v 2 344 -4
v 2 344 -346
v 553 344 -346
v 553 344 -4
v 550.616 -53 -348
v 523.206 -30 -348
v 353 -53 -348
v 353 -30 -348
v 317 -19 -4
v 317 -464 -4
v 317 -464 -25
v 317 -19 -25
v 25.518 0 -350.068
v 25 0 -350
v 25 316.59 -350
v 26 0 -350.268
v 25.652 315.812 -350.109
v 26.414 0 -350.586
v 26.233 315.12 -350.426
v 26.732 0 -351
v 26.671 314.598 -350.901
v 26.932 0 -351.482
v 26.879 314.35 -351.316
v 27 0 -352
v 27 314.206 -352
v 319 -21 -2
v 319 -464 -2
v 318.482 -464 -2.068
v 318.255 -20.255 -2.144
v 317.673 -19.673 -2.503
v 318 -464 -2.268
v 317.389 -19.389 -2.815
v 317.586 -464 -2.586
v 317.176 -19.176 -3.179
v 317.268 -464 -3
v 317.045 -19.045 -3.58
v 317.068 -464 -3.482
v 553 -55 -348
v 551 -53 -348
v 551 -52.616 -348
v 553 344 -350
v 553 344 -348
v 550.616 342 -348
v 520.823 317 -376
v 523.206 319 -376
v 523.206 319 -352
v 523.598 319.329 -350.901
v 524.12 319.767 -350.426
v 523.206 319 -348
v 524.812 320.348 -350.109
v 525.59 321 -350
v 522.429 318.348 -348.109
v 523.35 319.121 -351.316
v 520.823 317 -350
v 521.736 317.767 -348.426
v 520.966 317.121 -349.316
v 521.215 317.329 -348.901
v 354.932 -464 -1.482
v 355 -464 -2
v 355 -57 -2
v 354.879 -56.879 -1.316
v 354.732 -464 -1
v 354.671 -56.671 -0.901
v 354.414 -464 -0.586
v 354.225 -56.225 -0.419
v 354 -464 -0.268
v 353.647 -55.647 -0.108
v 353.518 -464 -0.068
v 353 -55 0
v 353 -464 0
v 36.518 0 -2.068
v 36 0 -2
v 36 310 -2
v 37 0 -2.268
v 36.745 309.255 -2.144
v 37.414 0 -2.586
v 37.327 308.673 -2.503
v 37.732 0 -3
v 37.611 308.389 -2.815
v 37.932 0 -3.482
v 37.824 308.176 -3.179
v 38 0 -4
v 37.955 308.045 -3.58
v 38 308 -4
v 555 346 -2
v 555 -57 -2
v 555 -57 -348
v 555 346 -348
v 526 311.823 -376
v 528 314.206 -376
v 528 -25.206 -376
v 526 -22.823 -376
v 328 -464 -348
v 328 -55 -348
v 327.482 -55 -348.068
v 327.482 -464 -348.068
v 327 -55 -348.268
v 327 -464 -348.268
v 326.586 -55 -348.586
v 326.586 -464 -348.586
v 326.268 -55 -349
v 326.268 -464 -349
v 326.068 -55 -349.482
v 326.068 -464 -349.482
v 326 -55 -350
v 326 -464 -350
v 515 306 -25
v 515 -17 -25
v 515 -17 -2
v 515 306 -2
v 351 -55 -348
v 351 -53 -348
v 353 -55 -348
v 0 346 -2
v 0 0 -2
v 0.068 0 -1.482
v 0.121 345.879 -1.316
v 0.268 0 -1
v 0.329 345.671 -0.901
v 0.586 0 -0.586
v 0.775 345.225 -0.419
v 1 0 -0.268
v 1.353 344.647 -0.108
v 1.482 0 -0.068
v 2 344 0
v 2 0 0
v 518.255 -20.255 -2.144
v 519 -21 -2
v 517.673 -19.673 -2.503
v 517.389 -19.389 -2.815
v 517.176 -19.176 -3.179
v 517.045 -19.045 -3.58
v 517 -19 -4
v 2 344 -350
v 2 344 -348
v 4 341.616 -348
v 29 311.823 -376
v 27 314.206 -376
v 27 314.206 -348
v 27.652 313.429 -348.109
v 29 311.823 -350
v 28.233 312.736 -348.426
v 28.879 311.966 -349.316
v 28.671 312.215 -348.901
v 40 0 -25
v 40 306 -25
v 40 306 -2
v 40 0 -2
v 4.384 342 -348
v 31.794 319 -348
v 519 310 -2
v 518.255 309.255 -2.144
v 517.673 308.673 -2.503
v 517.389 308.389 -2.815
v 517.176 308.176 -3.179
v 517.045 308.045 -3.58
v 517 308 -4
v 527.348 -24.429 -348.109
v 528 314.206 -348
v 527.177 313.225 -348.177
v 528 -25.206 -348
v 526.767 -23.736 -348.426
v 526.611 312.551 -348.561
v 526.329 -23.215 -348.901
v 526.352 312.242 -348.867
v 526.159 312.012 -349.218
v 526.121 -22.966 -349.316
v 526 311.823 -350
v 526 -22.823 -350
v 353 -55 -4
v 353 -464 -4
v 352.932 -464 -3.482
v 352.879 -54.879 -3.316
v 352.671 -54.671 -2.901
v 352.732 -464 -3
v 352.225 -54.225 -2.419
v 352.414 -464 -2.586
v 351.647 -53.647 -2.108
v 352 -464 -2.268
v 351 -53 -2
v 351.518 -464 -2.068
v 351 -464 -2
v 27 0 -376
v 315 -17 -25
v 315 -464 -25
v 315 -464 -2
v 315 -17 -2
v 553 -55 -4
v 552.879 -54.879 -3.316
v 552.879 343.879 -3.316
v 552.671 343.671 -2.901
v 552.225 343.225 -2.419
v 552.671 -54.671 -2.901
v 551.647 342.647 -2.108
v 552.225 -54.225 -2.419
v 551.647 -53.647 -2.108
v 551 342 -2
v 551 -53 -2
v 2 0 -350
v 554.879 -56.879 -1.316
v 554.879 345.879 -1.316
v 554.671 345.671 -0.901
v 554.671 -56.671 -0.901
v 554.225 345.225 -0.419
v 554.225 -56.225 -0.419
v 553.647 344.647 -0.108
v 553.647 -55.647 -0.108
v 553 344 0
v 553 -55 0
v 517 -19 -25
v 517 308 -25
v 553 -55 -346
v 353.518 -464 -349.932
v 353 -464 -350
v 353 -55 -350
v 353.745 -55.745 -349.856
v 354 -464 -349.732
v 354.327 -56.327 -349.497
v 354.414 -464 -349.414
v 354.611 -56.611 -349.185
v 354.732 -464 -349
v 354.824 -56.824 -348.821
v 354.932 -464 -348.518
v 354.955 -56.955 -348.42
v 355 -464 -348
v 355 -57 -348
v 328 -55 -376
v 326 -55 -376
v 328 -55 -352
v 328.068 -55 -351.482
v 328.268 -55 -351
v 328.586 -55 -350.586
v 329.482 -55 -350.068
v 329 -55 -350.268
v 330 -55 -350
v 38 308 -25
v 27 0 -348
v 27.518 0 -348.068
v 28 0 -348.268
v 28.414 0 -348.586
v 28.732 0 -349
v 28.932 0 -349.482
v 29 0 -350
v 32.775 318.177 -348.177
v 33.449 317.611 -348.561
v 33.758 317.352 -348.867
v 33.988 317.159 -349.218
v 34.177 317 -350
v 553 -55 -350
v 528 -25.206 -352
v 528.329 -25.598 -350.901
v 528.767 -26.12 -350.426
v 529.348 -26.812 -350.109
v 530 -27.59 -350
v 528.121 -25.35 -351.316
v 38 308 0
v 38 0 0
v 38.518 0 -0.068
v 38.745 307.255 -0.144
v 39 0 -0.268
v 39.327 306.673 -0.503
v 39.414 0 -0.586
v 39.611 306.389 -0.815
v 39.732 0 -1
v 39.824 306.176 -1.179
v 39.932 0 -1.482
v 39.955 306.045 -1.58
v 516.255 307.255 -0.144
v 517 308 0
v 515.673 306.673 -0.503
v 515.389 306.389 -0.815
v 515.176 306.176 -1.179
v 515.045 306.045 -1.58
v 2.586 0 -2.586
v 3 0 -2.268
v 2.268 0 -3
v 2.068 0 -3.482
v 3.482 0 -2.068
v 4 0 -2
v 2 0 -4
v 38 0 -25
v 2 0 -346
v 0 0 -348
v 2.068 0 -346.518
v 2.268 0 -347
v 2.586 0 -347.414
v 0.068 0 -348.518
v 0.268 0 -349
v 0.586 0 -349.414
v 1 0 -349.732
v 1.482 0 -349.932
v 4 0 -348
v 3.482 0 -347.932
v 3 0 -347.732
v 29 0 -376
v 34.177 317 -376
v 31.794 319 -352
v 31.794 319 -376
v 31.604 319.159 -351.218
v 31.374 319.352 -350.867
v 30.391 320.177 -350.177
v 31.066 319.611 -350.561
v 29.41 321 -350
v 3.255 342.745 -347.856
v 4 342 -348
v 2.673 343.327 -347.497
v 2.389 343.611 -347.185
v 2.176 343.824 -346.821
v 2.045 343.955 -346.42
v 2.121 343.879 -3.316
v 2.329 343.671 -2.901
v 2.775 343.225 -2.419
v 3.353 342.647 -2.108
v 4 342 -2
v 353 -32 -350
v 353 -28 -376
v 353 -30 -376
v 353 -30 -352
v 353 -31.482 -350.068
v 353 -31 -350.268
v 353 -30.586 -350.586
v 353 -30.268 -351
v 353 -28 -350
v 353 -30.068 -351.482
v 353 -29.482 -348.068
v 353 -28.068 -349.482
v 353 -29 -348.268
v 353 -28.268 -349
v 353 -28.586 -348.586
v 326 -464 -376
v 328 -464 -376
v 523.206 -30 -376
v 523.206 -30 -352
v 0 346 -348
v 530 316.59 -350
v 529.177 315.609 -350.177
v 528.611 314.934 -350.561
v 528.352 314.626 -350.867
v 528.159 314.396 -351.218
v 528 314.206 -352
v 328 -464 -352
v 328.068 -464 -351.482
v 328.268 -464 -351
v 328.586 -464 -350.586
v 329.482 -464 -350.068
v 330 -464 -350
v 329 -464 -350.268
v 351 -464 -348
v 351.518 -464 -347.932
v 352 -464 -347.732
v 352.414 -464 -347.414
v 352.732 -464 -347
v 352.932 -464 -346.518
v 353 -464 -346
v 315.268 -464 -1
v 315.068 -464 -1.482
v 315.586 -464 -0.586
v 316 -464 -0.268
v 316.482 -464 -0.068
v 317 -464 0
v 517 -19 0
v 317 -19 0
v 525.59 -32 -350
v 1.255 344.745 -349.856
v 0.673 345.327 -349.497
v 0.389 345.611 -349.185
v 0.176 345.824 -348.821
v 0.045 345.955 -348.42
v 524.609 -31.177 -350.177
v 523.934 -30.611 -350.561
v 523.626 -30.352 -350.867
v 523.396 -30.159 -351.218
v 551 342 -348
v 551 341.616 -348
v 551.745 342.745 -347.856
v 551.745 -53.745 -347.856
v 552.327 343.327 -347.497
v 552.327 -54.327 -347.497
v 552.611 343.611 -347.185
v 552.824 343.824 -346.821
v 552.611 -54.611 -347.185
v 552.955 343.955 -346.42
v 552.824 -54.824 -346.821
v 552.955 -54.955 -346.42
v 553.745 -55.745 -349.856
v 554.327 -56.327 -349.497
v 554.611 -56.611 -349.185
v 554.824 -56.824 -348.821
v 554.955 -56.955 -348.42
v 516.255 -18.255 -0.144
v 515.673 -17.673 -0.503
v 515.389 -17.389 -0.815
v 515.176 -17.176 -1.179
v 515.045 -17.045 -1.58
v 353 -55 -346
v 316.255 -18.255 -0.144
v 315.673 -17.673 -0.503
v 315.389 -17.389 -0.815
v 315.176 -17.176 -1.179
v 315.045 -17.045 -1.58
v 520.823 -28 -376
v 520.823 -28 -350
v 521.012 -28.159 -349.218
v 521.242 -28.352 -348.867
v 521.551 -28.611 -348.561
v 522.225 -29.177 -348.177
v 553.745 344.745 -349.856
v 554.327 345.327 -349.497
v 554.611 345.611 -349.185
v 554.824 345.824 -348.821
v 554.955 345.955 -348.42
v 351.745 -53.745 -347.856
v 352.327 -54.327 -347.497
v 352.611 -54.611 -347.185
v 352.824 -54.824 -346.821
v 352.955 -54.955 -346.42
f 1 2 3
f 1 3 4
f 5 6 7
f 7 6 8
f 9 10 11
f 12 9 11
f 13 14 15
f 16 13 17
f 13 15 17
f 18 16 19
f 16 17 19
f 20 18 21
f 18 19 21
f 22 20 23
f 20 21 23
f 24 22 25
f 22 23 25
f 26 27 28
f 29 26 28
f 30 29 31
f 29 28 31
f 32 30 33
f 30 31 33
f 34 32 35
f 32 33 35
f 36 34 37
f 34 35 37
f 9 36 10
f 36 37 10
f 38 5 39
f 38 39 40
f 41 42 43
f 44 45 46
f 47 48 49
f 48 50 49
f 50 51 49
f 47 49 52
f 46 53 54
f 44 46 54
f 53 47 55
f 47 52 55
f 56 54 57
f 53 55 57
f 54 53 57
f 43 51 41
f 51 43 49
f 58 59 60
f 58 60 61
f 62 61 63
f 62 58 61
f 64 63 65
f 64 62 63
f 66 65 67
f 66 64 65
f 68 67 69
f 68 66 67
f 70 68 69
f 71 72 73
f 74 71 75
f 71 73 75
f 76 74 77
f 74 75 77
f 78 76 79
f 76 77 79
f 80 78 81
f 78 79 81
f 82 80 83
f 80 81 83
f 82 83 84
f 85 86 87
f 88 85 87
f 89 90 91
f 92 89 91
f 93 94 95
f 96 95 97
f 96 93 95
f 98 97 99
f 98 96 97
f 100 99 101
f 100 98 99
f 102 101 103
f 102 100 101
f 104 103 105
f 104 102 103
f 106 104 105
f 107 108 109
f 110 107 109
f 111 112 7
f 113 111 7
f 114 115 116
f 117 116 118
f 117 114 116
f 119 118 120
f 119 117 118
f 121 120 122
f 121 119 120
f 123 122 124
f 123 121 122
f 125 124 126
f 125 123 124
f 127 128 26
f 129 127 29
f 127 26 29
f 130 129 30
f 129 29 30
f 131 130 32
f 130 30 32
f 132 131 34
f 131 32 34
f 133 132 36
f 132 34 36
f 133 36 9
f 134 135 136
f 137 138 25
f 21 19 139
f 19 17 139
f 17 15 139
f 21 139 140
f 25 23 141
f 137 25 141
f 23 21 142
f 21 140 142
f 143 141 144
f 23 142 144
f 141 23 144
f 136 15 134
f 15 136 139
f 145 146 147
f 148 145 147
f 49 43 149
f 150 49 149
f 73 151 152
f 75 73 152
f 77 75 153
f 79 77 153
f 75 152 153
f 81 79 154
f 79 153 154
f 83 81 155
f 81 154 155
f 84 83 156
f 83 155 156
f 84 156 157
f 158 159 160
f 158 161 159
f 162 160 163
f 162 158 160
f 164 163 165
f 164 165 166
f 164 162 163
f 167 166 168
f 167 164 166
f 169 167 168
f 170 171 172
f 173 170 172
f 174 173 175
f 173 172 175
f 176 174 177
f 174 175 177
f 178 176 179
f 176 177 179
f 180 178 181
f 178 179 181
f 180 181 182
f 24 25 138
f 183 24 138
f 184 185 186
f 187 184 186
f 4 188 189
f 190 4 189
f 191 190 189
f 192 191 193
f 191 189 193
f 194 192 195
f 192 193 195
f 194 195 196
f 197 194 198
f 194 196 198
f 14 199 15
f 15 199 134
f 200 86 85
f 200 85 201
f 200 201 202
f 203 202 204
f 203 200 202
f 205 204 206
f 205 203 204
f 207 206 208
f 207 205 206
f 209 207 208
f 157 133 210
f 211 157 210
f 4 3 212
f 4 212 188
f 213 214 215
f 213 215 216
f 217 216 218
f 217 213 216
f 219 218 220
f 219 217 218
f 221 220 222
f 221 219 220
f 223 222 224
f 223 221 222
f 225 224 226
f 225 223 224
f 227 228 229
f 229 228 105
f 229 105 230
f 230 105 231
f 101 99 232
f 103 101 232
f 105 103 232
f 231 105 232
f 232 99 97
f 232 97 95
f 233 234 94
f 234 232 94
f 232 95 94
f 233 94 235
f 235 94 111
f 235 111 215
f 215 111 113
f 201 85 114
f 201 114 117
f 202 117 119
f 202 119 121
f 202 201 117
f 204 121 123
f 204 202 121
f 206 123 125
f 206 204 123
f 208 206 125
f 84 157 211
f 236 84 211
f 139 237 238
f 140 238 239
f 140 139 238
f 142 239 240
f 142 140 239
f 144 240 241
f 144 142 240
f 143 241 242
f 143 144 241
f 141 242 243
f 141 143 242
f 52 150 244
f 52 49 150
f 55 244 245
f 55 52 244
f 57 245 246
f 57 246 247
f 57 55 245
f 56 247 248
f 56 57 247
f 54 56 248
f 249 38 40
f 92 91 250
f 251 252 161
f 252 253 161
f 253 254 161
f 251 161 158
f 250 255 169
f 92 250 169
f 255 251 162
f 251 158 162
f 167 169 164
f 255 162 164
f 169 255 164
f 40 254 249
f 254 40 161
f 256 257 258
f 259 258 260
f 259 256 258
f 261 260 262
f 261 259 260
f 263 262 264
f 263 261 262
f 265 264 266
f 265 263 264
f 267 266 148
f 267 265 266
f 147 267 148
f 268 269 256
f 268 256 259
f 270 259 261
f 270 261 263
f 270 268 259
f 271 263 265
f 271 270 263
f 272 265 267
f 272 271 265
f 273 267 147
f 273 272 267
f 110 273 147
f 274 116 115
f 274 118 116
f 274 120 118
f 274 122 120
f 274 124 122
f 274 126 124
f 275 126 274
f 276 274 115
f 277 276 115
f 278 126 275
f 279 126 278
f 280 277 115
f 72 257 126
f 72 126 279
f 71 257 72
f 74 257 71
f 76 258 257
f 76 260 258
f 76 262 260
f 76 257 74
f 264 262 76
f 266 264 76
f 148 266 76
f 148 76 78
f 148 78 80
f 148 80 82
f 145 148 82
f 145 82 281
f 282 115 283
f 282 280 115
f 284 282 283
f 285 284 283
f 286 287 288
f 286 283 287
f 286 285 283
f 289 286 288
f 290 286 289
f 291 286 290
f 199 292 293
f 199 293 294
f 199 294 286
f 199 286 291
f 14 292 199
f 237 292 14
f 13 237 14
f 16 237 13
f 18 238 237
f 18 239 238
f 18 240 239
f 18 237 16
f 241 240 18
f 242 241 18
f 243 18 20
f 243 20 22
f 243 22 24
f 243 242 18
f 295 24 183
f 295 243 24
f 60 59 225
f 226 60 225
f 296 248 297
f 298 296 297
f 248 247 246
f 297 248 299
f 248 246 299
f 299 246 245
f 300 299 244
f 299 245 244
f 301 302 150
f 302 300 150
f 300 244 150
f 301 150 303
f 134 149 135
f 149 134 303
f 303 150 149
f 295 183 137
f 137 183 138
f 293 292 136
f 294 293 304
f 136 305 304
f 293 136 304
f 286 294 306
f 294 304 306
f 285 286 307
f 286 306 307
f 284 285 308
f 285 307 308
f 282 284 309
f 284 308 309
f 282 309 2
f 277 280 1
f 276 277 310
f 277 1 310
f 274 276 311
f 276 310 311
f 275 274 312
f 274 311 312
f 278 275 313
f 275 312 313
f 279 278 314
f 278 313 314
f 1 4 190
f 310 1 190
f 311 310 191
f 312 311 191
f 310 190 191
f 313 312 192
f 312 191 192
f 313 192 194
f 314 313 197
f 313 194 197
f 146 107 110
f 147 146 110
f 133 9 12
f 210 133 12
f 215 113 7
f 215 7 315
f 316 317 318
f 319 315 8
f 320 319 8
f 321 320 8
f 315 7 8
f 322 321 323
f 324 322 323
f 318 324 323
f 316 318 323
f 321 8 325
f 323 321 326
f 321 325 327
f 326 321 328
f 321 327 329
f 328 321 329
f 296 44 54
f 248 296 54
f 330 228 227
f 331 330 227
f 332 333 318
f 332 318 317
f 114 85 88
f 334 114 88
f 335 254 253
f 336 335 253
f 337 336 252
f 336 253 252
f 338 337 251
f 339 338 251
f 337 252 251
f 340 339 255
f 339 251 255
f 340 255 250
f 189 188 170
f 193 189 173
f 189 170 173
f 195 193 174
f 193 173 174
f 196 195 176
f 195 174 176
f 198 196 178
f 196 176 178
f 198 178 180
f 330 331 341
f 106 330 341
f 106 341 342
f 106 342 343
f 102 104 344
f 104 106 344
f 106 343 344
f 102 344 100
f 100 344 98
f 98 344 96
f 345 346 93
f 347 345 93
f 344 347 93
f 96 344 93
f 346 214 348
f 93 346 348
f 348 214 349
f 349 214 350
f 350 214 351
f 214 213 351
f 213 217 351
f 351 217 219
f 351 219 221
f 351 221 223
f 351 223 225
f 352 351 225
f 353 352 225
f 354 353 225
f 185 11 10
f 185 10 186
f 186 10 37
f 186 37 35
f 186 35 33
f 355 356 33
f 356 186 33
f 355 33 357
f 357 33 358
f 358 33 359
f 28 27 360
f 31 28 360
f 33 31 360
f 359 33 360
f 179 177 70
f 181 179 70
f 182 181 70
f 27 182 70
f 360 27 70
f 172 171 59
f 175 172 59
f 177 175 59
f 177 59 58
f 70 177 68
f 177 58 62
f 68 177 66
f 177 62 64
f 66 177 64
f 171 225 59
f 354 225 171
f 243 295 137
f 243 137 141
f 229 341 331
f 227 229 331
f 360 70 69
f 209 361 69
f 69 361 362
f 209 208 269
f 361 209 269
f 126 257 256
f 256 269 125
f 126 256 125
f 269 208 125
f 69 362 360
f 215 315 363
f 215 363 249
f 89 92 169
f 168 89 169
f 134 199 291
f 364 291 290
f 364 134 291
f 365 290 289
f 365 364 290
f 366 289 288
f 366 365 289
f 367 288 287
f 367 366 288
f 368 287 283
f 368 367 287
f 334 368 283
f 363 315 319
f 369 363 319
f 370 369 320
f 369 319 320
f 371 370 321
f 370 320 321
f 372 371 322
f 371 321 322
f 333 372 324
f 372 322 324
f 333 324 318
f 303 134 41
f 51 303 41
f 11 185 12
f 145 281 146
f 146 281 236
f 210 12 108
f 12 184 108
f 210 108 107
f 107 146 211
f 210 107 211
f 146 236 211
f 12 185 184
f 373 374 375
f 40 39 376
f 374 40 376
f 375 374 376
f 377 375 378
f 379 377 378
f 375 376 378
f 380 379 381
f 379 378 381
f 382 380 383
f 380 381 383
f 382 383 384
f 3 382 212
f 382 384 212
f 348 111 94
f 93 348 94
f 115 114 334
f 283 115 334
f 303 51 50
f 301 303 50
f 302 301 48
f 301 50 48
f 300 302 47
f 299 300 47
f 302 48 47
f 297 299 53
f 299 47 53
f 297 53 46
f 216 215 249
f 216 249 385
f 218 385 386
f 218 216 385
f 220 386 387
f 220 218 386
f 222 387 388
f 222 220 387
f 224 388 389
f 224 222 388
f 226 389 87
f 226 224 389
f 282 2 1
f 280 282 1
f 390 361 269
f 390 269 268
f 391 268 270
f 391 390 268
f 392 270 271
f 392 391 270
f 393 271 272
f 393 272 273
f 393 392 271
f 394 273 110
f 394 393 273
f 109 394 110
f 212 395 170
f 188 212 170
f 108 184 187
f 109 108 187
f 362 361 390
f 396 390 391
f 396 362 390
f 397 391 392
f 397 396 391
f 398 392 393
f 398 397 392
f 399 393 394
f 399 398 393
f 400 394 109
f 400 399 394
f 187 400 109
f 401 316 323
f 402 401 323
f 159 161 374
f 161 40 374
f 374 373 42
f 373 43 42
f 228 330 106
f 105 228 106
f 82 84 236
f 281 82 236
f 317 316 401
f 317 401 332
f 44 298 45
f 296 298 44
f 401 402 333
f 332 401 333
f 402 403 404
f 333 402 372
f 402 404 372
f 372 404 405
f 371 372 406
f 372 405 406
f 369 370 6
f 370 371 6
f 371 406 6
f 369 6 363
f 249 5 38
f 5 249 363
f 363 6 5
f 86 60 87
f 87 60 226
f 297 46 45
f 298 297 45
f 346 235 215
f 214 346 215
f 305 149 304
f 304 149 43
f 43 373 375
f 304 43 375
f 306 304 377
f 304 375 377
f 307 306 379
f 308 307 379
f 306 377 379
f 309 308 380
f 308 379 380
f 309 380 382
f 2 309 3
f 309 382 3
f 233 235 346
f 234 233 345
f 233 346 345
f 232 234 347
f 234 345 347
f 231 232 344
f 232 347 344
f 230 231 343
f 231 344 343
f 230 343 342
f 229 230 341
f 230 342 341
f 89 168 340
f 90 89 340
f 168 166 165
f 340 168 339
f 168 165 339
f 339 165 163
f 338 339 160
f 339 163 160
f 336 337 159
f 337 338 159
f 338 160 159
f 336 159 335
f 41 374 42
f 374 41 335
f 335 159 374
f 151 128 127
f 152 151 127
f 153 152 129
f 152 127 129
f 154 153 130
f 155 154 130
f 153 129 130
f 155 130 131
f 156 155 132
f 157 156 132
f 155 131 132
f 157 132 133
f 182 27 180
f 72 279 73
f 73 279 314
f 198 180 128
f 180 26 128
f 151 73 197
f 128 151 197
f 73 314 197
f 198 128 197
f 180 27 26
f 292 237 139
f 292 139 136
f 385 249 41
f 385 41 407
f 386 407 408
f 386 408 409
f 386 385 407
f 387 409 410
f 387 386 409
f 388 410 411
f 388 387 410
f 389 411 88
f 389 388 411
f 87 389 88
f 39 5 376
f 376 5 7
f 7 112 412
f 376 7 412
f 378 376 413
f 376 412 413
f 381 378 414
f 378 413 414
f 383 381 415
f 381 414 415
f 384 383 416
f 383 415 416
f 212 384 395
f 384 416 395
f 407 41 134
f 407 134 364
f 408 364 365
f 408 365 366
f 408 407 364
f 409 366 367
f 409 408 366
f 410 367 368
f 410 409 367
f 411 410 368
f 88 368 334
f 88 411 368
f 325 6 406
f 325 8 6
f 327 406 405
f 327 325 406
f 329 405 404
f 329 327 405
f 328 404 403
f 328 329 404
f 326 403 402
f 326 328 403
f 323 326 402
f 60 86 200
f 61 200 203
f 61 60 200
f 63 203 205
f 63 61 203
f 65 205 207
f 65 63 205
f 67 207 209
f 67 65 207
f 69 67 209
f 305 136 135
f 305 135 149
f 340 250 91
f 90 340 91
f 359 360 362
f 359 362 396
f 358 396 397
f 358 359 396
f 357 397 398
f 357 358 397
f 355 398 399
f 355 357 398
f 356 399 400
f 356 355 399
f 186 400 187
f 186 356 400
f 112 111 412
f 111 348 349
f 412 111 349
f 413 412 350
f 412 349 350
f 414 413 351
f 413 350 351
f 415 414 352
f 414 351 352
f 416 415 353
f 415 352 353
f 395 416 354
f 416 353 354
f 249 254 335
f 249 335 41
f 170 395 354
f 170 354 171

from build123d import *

# Parameters (mm, degrees)
F3_W     = 27
F3_H     = 27
F4_DEPTH = 40


with BuildPart() as f2:
    # F2: sweep along a path in F1
    with BuildLine(Plane.XY) as f2_path:
        Line((0, 0), (0, 346))
        Line((0, 346), (555, 346))
        Line((555, 346), (555, -57))
        Line((555, -57), (355, -57))
        Line((355, -57), (355, -464))
    # F0 (on Front) → F2 (sweep)
    with BuildSketch(Plane.XZ):
        with BuildLine():
            Line((38, 0), (2, 0))
            ThreePointArc((2, 0), (0.5857864376, -0.5857864376), (0, -2))
            Line((0, -2), (0, -348))
            ThreePointArc((0, -348), (0.5857864376, -349.4142135624), (2, -350))
            Line((2, -350), (25, -350))
            ThreePointArc((25, -350), (26.4142135624, -350.5857864376), (27, -352))
            Line((27, -352), (27, -376))
            Line((27, -376), (29, -376))
            Line((29, -376), (29, -350))
            ThreePointArc((29, -350), (28.4142135624, -348.5857864376), (27, -348))
            Line((27, -348), (4, -348))
            ThreePointArc((4, -348), (2.5857864376, -347.4142135624), (2, -346))
            Line((2, -346), (2, -4))
            ThreePointArc((2, -4), (2.5857864376, -2.5857864376), (4, -2))
            Line((4, -2), (36, -2))
            ThreePointArc((36, -2), (37.4142135624, -2.5857864376), (38, -4))
            Line((38, -4), (38, -25))
            Line((38, -25), (40, -25))
            Line((40, -25), (40, -2))
            ThreePointArc((40, -2), (39.4142135624, -0.5857864376), (38, 0))
        make_face()
    sweep(path=f2_path.line, transition=Transition.RIGHT)

    # F3 (on face) → F4 (cut)
    with BuildSketch(Plane.XY.offset(-348)):
        Polygon((2, 344), (29, 311.822653), (29, 317), (34.177347, 317), align=None)
        Polygon((526, 311.822653), (553, 344), (520.822653, 317), (526, 317), align=None)
        Polygon((520.822653, -28), (553, -55), (526, -22.822653), (526, -28), align=None)
        with Locations((339.5, -41.5)):
            Rectangle(F3_W, F3_H)
    extrude(amount=-F4_DEPTH, mode=Mode.SUBTRACT)


solid = f2.part
